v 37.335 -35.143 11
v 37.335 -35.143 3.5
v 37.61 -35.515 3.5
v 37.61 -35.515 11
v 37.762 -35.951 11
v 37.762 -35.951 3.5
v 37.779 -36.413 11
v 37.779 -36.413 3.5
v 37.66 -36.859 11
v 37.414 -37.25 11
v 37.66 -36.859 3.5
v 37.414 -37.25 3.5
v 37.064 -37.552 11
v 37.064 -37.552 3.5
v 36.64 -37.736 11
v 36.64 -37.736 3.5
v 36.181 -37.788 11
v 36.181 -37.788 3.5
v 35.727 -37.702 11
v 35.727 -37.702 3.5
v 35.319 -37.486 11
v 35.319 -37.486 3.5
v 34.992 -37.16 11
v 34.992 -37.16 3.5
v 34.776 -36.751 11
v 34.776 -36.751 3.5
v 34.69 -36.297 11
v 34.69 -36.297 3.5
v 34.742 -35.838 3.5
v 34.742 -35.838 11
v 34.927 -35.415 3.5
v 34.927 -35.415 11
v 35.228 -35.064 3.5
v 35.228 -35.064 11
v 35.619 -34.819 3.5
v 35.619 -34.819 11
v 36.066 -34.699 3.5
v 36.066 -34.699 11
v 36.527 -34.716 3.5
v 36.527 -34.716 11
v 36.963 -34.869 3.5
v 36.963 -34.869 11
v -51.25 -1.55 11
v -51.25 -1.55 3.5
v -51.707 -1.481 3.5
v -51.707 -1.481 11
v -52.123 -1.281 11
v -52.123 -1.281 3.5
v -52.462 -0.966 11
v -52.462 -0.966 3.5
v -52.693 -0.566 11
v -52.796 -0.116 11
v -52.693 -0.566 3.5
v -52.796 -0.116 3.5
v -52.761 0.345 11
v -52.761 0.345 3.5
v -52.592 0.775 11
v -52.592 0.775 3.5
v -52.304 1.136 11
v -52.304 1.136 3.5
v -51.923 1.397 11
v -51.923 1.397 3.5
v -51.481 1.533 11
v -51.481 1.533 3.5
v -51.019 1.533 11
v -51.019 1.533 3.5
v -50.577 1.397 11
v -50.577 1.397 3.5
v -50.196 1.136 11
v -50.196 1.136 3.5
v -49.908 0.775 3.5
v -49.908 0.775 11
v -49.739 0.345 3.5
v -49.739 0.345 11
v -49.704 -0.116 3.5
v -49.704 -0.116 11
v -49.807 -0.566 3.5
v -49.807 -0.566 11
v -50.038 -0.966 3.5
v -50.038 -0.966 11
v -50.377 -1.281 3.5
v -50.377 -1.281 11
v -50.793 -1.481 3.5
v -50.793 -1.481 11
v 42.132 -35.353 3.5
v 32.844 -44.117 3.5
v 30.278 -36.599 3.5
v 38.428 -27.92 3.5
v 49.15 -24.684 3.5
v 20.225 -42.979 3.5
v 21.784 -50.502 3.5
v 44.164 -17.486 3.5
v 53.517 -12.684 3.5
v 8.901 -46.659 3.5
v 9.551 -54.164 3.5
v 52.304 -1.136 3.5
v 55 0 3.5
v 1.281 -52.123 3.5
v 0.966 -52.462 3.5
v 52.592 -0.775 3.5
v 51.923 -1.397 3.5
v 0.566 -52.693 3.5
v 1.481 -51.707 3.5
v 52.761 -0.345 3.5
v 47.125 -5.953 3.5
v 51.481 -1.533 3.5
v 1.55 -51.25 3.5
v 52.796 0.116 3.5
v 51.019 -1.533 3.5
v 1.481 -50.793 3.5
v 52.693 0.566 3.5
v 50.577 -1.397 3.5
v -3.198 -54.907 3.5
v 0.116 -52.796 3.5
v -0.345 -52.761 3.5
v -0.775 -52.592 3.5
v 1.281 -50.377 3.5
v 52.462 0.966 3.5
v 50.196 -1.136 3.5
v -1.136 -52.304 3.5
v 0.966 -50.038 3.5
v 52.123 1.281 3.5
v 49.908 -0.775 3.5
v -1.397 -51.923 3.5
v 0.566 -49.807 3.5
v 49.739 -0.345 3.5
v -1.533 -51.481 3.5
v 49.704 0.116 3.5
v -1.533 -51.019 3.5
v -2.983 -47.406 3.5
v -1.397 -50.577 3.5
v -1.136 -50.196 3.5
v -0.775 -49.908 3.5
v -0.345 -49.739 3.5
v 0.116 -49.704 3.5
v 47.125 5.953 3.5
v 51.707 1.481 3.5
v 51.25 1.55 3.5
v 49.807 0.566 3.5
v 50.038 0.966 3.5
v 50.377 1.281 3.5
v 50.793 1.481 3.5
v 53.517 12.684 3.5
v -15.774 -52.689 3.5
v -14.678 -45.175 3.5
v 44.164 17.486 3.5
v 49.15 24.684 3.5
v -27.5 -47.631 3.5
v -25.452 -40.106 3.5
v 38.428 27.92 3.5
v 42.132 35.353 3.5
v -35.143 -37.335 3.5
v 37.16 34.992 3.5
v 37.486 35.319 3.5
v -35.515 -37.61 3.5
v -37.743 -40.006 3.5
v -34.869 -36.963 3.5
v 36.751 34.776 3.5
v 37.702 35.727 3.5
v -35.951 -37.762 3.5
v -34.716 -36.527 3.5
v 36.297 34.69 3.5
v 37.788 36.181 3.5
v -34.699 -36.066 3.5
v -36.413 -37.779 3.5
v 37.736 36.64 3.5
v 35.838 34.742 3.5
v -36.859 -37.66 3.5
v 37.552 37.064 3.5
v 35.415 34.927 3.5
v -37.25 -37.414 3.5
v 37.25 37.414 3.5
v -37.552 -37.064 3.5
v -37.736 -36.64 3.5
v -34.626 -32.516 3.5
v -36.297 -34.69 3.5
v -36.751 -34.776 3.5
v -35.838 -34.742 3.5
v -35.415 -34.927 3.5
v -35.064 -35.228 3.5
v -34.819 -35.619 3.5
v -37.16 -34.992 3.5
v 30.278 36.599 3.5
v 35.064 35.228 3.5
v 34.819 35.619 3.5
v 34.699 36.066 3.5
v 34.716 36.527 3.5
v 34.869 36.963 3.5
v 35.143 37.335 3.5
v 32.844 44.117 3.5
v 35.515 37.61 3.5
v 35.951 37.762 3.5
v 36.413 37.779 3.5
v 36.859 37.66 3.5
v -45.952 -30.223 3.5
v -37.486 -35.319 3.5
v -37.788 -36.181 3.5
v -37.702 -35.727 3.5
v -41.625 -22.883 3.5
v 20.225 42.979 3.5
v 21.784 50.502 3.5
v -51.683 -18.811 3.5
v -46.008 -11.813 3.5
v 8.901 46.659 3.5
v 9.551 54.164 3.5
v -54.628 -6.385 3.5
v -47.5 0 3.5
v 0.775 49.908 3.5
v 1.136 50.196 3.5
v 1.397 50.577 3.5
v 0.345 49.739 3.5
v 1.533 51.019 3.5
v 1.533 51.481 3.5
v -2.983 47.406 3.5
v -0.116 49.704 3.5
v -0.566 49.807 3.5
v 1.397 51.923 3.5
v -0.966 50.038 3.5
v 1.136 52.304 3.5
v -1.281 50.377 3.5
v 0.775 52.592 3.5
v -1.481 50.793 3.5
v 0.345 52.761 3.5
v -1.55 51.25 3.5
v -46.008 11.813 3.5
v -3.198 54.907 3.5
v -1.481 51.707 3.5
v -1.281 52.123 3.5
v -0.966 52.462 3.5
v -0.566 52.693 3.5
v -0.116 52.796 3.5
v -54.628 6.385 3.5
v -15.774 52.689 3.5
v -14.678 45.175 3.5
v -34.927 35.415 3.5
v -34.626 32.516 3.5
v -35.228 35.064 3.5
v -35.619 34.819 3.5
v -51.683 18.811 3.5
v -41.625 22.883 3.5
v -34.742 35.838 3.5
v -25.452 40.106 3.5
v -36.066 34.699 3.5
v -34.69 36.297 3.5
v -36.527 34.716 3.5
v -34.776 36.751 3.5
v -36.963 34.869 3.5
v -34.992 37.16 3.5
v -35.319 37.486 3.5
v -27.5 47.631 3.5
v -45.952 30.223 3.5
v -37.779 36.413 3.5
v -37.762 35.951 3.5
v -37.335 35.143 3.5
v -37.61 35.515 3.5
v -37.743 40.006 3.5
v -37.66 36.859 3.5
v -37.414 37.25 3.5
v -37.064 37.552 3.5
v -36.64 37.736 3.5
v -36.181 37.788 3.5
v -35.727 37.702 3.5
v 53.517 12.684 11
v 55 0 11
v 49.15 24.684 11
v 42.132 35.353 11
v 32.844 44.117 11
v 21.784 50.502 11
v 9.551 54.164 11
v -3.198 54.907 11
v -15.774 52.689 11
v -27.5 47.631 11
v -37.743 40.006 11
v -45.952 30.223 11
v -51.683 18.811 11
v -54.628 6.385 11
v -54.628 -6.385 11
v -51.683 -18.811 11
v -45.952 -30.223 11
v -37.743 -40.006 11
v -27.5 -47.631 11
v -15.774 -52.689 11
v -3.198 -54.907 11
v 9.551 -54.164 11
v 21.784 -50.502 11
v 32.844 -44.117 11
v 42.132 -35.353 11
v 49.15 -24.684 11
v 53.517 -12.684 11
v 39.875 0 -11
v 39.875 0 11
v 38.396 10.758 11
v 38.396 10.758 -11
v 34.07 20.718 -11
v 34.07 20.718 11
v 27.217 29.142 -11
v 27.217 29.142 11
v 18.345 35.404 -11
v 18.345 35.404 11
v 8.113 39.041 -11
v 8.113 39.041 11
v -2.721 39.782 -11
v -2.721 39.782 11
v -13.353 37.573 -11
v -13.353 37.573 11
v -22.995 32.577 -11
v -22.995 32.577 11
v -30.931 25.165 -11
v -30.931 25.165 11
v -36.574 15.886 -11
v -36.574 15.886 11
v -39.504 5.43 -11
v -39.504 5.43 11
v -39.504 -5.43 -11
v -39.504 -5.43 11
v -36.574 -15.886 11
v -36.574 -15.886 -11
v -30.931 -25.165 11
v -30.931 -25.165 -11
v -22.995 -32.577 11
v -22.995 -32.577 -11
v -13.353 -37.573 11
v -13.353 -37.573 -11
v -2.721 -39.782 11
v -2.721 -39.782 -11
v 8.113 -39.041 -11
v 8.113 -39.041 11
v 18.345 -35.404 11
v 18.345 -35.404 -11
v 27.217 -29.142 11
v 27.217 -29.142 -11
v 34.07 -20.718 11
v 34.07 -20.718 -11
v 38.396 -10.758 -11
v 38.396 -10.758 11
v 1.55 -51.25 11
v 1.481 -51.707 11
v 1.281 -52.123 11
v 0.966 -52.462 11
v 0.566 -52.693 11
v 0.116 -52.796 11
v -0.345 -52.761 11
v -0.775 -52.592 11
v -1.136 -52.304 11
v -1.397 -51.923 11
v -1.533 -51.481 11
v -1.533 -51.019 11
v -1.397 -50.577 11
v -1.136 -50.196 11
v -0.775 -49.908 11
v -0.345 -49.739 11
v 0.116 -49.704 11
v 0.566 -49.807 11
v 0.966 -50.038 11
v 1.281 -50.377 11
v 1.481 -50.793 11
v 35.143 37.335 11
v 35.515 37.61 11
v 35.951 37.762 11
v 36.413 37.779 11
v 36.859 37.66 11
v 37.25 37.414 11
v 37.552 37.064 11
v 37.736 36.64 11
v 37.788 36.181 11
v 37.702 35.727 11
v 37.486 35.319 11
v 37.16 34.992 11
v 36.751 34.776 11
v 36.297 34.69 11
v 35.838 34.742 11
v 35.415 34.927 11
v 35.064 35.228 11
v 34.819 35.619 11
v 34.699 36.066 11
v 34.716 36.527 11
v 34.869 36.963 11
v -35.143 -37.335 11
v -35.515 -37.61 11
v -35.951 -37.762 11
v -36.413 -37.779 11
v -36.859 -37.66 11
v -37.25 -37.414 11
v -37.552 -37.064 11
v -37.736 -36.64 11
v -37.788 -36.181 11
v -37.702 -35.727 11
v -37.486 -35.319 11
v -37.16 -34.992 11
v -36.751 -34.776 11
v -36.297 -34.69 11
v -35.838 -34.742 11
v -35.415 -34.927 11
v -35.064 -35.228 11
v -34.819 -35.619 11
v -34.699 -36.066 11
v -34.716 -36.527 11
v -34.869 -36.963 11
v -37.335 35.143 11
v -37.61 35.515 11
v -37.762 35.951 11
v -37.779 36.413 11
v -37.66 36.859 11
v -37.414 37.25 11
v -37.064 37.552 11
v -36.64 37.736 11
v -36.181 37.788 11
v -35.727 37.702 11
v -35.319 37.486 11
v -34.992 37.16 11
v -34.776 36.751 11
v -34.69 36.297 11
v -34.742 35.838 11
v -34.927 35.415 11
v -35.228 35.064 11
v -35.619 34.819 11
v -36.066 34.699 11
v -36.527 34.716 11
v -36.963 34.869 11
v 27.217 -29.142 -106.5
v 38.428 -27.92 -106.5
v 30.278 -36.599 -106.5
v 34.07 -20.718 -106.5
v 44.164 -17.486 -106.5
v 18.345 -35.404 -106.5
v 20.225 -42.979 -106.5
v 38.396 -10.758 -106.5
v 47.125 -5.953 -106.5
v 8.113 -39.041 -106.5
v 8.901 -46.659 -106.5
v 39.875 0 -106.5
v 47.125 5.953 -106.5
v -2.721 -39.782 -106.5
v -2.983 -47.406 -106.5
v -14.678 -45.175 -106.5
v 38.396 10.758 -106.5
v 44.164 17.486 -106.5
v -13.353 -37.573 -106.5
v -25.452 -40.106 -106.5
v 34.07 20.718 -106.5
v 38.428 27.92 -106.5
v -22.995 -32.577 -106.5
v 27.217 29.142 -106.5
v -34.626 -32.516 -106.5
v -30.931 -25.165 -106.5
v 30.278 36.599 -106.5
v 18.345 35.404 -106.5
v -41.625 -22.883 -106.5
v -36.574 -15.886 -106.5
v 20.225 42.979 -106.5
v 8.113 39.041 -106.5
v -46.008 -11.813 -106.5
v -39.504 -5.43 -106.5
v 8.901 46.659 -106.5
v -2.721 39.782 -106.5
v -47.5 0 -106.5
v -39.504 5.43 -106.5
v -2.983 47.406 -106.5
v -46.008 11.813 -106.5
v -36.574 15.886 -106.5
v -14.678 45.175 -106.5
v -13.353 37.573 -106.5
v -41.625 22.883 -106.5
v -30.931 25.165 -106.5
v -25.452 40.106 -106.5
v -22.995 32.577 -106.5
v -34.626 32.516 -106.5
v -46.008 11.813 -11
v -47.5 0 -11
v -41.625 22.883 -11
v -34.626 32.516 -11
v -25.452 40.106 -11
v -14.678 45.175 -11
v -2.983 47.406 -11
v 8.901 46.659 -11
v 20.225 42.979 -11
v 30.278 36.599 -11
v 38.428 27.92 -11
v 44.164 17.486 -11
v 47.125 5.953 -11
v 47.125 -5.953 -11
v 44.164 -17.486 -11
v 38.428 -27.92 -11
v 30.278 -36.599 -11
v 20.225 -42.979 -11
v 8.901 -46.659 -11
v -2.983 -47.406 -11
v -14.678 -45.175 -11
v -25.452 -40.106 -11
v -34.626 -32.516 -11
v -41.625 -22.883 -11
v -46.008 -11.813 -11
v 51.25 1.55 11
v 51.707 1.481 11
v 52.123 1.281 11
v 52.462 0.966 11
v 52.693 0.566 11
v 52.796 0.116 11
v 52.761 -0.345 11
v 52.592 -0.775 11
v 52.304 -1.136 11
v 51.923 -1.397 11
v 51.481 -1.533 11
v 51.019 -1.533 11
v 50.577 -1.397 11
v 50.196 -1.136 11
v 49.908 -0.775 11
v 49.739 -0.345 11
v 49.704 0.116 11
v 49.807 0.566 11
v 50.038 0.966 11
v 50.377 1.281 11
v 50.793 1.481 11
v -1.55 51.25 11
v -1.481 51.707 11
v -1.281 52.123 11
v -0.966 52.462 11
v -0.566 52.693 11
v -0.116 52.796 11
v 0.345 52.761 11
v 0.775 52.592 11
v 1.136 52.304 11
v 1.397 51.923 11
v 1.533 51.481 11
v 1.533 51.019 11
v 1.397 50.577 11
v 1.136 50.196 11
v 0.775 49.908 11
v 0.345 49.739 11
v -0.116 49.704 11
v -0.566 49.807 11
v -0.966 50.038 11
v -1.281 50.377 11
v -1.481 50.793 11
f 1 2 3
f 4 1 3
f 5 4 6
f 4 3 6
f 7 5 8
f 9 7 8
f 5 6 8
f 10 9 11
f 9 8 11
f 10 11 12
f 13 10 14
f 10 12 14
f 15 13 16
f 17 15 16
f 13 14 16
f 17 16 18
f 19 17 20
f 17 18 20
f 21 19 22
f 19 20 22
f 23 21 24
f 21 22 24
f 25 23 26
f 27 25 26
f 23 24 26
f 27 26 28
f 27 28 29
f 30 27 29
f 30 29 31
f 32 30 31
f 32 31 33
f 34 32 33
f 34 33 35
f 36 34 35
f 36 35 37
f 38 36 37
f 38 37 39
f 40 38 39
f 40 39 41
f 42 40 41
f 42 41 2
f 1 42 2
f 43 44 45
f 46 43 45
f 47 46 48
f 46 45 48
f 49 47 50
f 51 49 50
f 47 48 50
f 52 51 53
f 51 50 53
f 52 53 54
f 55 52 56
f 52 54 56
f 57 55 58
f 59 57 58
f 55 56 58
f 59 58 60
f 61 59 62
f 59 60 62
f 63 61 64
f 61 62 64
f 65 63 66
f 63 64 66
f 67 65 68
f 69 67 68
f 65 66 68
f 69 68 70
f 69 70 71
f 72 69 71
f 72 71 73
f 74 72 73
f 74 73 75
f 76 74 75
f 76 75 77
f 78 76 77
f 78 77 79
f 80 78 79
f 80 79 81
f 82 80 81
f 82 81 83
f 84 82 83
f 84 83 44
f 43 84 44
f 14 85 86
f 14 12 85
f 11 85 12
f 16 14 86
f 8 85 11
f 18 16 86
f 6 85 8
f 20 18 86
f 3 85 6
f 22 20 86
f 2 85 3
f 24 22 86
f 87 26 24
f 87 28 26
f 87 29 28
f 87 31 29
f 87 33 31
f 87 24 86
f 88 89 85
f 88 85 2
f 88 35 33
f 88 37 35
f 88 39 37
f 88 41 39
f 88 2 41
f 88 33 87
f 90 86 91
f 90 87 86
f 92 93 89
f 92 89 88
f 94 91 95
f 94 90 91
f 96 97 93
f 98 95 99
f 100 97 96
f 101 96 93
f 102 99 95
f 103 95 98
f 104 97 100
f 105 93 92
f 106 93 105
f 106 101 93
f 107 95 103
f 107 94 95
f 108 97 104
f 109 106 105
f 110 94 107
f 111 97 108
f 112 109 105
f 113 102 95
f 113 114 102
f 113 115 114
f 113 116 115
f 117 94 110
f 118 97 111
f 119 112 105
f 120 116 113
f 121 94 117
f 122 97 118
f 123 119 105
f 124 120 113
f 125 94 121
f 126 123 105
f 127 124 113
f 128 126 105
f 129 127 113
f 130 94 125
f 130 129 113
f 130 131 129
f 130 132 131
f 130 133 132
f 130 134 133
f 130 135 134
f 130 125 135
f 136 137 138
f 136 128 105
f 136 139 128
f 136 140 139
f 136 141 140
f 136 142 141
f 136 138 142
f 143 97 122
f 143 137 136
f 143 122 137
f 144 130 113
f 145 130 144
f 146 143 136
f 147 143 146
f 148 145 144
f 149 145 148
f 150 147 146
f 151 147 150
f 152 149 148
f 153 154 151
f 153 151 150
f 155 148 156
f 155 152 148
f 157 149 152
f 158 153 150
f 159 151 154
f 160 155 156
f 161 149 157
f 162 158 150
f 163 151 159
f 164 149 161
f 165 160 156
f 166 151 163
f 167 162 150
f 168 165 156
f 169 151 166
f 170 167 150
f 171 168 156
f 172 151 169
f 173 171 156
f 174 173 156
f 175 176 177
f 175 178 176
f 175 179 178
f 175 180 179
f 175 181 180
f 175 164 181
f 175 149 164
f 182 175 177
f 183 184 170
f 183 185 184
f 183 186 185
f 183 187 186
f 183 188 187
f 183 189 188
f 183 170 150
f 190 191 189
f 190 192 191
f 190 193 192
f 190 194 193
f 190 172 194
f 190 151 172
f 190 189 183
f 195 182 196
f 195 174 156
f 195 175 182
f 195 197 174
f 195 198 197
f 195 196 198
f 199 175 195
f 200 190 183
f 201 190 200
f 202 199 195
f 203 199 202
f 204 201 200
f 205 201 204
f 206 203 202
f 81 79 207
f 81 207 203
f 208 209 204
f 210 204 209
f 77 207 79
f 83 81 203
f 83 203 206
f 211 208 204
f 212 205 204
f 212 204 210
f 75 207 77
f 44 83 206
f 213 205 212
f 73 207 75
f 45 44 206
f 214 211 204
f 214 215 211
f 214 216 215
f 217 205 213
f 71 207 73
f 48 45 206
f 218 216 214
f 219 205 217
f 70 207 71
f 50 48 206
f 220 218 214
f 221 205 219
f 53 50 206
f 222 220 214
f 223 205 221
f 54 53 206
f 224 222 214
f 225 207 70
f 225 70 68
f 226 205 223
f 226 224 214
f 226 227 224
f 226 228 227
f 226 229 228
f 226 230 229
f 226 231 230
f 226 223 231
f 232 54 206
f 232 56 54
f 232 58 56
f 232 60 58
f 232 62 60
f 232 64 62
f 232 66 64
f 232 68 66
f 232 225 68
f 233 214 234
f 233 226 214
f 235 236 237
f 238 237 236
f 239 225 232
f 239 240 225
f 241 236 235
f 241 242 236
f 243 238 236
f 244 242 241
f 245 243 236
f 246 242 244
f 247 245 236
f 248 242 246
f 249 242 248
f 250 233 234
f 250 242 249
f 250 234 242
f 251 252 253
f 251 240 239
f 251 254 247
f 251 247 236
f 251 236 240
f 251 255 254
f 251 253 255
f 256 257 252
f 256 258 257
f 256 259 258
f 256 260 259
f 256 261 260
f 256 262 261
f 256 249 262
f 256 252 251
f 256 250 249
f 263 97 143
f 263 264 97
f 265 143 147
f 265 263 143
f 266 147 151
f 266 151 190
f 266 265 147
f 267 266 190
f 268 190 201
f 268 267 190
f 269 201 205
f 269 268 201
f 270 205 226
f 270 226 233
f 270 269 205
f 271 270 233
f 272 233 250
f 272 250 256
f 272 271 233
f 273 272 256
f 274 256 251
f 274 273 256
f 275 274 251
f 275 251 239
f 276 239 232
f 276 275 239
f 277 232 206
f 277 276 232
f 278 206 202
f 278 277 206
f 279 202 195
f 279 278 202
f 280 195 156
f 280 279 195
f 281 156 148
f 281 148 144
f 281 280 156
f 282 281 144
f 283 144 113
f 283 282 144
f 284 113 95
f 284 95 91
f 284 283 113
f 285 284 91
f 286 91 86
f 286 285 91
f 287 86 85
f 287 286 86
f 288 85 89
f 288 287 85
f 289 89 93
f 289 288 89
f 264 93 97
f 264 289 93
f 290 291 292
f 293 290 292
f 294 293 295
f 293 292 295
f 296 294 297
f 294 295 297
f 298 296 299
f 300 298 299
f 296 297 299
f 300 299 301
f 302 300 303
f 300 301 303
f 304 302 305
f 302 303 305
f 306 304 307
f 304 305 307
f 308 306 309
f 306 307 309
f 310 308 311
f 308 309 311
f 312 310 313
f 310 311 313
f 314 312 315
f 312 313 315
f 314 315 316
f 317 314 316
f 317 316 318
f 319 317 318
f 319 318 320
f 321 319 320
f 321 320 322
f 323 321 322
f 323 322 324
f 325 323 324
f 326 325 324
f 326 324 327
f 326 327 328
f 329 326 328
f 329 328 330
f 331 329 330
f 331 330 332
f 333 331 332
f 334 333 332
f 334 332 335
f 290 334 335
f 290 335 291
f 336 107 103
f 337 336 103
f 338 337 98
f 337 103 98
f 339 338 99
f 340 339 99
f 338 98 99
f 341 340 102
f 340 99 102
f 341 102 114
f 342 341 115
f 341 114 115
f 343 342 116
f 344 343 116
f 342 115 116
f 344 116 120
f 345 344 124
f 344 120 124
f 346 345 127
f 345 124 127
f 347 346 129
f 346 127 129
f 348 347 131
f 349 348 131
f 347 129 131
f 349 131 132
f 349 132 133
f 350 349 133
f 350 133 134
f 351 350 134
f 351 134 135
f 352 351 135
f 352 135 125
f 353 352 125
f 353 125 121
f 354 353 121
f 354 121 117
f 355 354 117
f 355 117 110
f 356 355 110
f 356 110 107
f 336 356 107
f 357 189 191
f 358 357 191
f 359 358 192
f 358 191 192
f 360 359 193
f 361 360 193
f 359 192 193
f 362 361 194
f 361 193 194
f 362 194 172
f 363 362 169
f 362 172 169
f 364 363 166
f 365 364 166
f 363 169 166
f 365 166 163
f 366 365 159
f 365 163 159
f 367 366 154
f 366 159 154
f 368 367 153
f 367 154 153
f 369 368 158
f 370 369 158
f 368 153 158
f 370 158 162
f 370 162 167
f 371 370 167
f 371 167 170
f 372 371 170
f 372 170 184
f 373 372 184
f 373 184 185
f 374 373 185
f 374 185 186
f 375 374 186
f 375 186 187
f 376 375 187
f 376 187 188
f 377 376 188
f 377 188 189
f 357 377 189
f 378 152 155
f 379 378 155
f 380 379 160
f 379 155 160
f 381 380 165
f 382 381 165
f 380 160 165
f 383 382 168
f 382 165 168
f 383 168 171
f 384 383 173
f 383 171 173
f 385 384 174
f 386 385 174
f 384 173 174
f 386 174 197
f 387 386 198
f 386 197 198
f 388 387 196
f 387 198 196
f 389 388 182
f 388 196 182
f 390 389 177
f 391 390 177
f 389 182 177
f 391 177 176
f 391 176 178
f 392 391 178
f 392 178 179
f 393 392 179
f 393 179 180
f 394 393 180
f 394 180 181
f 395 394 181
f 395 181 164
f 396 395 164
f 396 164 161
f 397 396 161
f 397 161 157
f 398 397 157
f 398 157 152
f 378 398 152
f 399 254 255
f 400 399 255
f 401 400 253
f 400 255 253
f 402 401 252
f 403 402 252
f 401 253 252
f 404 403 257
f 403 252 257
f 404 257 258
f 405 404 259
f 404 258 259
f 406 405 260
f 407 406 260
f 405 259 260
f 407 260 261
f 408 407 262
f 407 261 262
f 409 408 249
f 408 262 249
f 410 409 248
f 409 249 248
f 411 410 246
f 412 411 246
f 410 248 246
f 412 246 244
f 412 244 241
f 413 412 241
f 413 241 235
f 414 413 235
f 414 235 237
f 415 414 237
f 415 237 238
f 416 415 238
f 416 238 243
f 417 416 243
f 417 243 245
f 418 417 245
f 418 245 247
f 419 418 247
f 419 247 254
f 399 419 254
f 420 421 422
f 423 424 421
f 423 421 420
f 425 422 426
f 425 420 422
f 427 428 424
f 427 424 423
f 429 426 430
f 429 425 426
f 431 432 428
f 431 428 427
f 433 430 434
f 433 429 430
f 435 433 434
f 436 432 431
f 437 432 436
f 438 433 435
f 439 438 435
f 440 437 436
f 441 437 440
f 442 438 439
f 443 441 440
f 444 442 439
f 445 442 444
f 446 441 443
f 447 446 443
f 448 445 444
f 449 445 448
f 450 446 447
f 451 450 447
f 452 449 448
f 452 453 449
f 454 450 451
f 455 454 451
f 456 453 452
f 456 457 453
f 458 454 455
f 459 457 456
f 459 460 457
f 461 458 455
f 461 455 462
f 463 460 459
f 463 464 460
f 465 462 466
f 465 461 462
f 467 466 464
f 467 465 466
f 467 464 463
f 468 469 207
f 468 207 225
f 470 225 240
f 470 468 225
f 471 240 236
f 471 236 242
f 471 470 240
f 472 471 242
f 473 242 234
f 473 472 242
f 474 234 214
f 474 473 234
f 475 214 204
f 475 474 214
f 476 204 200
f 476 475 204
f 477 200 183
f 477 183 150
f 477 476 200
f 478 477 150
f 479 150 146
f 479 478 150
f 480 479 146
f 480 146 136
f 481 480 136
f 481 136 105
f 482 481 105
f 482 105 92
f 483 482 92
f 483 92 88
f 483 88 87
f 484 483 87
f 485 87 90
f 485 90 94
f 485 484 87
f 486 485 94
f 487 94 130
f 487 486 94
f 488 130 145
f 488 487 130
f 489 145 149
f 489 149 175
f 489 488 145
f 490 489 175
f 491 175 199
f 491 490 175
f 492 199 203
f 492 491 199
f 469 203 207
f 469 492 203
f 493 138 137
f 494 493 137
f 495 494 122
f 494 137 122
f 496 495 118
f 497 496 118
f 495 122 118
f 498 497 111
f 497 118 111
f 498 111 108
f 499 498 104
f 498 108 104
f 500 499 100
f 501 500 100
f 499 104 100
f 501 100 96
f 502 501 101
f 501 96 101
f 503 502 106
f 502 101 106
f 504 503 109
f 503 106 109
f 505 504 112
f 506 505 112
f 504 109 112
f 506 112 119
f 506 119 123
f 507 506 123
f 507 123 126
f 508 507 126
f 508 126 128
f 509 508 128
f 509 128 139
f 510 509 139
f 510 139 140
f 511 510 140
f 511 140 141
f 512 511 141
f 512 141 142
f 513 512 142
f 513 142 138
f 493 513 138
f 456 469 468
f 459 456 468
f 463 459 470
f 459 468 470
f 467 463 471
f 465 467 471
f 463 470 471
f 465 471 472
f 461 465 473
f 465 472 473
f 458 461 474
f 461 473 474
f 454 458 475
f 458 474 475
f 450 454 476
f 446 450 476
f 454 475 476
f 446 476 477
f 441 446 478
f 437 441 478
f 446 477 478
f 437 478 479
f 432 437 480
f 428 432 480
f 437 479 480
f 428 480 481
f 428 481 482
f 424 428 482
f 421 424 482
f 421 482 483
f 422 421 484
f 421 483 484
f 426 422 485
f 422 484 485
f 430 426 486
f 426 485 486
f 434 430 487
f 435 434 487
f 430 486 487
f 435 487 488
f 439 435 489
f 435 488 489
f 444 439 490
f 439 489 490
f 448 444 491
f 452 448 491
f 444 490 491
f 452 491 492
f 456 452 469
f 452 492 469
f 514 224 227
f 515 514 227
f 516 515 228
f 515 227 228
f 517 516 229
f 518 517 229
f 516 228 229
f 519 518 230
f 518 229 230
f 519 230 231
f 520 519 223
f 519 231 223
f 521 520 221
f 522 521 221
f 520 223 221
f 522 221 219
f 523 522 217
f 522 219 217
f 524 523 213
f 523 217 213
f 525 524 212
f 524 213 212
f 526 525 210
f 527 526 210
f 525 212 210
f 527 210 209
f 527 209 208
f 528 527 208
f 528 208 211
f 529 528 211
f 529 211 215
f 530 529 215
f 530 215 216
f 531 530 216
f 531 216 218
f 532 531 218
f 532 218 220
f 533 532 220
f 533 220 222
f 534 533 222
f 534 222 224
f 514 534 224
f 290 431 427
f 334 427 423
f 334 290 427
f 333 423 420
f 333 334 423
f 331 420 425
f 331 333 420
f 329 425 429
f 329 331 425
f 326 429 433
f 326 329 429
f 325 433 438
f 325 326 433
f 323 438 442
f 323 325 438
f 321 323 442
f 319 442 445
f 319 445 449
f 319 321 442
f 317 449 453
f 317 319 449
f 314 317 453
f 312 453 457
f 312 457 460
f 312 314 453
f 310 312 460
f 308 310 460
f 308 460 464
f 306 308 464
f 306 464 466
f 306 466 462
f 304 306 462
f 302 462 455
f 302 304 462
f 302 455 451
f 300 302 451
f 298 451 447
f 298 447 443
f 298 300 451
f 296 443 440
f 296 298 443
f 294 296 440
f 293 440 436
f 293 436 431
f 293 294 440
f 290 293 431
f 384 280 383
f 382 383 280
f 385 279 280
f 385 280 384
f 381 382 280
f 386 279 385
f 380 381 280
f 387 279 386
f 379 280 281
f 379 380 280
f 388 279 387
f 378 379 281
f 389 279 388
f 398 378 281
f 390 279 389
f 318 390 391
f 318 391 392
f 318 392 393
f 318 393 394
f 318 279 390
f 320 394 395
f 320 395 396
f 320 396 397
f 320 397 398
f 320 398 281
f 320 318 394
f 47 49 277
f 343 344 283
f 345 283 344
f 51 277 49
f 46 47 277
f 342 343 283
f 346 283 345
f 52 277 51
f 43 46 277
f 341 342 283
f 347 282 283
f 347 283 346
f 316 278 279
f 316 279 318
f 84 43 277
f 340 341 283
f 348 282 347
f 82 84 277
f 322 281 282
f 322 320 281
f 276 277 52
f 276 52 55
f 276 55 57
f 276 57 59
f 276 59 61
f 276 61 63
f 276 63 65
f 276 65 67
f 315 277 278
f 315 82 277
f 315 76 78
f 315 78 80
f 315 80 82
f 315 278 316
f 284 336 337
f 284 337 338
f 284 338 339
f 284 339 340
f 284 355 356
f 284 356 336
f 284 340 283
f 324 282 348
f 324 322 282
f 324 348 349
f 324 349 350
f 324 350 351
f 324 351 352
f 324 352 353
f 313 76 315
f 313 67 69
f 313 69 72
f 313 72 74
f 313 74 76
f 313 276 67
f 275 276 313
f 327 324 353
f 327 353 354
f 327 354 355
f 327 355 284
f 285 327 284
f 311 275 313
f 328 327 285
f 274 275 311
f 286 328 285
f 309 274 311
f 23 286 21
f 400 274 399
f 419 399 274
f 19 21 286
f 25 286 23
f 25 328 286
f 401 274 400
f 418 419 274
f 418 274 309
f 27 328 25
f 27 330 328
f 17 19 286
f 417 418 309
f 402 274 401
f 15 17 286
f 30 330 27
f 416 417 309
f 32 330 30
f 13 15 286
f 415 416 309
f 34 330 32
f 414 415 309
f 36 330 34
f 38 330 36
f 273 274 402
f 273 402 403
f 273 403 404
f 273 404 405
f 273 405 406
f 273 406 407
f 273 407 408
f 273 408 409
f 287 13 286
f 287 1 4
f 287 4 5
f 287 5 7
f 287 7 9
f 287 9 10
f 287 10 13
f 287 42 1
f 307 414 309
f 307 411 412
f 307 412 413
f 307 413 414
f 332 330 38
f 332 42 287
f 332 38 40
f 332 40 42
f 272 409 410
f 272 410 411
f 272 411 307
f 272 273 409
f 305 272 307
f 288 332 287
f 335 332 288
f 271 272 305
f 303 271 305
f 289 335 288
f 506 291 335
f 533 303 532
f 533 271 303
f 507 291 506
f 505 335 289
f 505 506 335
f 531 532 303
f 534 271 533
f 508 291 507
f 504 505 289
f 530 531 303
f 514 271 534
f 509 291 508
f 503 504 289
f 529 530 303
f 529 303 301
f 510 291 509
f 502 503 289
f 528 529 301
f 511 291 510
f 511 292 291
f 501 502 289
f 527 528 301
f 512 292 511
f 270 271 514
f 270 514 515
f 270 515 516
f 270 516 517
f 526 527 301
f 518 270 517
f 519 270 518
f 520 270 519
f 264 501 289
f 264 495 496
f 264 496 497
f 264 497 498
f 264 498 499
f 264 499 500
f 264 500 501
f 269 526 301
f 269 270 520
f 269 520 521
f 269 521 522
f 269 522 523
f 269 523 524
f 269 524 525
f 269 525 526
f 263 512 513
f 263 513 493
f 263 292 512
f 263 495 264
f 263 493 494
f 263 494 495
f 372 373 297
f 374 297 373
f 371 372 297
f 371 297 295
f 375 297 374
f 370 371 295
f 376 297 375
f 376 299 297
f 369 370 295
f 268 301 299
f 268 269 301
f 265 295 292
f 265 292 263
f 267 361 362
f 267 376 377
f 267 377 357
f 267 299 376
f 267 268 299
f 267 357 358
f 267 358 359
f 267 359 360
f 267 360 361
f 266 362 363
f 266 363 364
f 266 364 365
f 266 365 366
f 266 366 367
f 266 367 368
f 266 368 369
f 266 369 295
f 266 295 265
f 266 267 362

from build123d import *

# Parameters (mm, degrees)
IZIM1_R                     = 55
Y_KSEKLIK_EKSTR_ZYON1_DEPTH = 11
IZIM2_OUTSIDE_W             = 143.422
IZIM2_OUTSIDE_H             = 143.422
IZIM2_OUTSIDE_R             = 47.5
KES_EKSTR_ZYON1_DEPTH       = 14.5
IZIM3_R                     = 1.55
KES_EKSTR_ZYON2_DEPTH       = 80.121741639
DAIRESEL_KAPLAMA1_COUNT     = 8
IZIM4_R                     = 39.875
KES_EKSTR_ZYON3_DEPTH       = 81.833161512
IZIM5_R                     = 47.5
IZIM5_R_2                   = 39.875
Y_KSEKLIK_EKSTR_ZYON2_DEPTH = 95.5


with BuildPart() as part:
    # Çizim1 → Yükseklik-Ekstrüzyon1 (new, symmetric)
    with BuildSketch(Plane.XY):
        Circle(IZIM1_R)
    extrude(amount=Y_KSEKLIK_EKSTR_ZYON1_DEPTH, both=True)

    # Çizim2 outside → Kes-Ekstrüzyon1 (cut)
    with BuildSketch(Plane(origin=(0, 0, -11), x_dir=(-1, 0, 0), z_dir=(0, 0, -1))):
        Rectangle(IZIM2_OUTSIDE_W, IZIM2_OUTSIDE_H)
        Circle(IZIM2_OUTSIDE_R, mode=Mode.SUBTRACT)
    extrude(amount=-KES_EKSTR_ZYON1_DEPTH, mode=Mode.SUBTRACT)

    # Çizim3 → Kes-Ekstrüzyon2 (cut, through all)
    with BuildSketch(Plane(origin=(0, 0, 3.5), x_dir=(-1, 0, 0), z_dir=(0, 0, -1))):
        with Locations((0, 51.25)):
            Circle(IZIM3_R)
    kes_ekstr_zyon2 = extrude(amount=-KES_EKSTR_ZYON2_DEPTH, mode=Mode.SUBTRACT)

    # Dairesel Kaplama1: Kes-Ekstrüzyon2 ×8 about axis
    dairesel_kaplama1_axis = Axis((0, 0, 0), (0, 0, 1))
    for i in range(1, DAIRESEL_KAPLAMA1_COUNT):
        add(kes_ekstr_zyon2.rotate(dairesel_kaplama1_axis, i * 360 / DAIRESEL_KAPLAMA1_COUNT), mode=Mode.SUBTRACT)

    # Çizim4 → Kes-Ekstrüzyon3 (cut, through all)
    with BuildSketch(Plane.XY.offset(11)):
        Circle(IZIM4_R)
    extrude(amount=-KES_EKSTR_ZYON3_DEPTH, mode=Mode.SUBTRACT)

    # Çizim5 → Yükseklik-Ekstrüzyon2 (add)
    with BuildSketch(Plane(origin=(0, 0, -11), x_dir=(-1, 0, 0), z_dir=(0, 0, -1))):
        Circle(IZIM5_R)
        with Locations(Location((0, 0, 0), (0, 0, 180))):
            Circle(IZIM5_R_2, mode=Mode.SUBTRACT)
    extrude(amount=Y_KSEKLIK_EKSTR_ZYON2_DEPTH)


solid = part.part
